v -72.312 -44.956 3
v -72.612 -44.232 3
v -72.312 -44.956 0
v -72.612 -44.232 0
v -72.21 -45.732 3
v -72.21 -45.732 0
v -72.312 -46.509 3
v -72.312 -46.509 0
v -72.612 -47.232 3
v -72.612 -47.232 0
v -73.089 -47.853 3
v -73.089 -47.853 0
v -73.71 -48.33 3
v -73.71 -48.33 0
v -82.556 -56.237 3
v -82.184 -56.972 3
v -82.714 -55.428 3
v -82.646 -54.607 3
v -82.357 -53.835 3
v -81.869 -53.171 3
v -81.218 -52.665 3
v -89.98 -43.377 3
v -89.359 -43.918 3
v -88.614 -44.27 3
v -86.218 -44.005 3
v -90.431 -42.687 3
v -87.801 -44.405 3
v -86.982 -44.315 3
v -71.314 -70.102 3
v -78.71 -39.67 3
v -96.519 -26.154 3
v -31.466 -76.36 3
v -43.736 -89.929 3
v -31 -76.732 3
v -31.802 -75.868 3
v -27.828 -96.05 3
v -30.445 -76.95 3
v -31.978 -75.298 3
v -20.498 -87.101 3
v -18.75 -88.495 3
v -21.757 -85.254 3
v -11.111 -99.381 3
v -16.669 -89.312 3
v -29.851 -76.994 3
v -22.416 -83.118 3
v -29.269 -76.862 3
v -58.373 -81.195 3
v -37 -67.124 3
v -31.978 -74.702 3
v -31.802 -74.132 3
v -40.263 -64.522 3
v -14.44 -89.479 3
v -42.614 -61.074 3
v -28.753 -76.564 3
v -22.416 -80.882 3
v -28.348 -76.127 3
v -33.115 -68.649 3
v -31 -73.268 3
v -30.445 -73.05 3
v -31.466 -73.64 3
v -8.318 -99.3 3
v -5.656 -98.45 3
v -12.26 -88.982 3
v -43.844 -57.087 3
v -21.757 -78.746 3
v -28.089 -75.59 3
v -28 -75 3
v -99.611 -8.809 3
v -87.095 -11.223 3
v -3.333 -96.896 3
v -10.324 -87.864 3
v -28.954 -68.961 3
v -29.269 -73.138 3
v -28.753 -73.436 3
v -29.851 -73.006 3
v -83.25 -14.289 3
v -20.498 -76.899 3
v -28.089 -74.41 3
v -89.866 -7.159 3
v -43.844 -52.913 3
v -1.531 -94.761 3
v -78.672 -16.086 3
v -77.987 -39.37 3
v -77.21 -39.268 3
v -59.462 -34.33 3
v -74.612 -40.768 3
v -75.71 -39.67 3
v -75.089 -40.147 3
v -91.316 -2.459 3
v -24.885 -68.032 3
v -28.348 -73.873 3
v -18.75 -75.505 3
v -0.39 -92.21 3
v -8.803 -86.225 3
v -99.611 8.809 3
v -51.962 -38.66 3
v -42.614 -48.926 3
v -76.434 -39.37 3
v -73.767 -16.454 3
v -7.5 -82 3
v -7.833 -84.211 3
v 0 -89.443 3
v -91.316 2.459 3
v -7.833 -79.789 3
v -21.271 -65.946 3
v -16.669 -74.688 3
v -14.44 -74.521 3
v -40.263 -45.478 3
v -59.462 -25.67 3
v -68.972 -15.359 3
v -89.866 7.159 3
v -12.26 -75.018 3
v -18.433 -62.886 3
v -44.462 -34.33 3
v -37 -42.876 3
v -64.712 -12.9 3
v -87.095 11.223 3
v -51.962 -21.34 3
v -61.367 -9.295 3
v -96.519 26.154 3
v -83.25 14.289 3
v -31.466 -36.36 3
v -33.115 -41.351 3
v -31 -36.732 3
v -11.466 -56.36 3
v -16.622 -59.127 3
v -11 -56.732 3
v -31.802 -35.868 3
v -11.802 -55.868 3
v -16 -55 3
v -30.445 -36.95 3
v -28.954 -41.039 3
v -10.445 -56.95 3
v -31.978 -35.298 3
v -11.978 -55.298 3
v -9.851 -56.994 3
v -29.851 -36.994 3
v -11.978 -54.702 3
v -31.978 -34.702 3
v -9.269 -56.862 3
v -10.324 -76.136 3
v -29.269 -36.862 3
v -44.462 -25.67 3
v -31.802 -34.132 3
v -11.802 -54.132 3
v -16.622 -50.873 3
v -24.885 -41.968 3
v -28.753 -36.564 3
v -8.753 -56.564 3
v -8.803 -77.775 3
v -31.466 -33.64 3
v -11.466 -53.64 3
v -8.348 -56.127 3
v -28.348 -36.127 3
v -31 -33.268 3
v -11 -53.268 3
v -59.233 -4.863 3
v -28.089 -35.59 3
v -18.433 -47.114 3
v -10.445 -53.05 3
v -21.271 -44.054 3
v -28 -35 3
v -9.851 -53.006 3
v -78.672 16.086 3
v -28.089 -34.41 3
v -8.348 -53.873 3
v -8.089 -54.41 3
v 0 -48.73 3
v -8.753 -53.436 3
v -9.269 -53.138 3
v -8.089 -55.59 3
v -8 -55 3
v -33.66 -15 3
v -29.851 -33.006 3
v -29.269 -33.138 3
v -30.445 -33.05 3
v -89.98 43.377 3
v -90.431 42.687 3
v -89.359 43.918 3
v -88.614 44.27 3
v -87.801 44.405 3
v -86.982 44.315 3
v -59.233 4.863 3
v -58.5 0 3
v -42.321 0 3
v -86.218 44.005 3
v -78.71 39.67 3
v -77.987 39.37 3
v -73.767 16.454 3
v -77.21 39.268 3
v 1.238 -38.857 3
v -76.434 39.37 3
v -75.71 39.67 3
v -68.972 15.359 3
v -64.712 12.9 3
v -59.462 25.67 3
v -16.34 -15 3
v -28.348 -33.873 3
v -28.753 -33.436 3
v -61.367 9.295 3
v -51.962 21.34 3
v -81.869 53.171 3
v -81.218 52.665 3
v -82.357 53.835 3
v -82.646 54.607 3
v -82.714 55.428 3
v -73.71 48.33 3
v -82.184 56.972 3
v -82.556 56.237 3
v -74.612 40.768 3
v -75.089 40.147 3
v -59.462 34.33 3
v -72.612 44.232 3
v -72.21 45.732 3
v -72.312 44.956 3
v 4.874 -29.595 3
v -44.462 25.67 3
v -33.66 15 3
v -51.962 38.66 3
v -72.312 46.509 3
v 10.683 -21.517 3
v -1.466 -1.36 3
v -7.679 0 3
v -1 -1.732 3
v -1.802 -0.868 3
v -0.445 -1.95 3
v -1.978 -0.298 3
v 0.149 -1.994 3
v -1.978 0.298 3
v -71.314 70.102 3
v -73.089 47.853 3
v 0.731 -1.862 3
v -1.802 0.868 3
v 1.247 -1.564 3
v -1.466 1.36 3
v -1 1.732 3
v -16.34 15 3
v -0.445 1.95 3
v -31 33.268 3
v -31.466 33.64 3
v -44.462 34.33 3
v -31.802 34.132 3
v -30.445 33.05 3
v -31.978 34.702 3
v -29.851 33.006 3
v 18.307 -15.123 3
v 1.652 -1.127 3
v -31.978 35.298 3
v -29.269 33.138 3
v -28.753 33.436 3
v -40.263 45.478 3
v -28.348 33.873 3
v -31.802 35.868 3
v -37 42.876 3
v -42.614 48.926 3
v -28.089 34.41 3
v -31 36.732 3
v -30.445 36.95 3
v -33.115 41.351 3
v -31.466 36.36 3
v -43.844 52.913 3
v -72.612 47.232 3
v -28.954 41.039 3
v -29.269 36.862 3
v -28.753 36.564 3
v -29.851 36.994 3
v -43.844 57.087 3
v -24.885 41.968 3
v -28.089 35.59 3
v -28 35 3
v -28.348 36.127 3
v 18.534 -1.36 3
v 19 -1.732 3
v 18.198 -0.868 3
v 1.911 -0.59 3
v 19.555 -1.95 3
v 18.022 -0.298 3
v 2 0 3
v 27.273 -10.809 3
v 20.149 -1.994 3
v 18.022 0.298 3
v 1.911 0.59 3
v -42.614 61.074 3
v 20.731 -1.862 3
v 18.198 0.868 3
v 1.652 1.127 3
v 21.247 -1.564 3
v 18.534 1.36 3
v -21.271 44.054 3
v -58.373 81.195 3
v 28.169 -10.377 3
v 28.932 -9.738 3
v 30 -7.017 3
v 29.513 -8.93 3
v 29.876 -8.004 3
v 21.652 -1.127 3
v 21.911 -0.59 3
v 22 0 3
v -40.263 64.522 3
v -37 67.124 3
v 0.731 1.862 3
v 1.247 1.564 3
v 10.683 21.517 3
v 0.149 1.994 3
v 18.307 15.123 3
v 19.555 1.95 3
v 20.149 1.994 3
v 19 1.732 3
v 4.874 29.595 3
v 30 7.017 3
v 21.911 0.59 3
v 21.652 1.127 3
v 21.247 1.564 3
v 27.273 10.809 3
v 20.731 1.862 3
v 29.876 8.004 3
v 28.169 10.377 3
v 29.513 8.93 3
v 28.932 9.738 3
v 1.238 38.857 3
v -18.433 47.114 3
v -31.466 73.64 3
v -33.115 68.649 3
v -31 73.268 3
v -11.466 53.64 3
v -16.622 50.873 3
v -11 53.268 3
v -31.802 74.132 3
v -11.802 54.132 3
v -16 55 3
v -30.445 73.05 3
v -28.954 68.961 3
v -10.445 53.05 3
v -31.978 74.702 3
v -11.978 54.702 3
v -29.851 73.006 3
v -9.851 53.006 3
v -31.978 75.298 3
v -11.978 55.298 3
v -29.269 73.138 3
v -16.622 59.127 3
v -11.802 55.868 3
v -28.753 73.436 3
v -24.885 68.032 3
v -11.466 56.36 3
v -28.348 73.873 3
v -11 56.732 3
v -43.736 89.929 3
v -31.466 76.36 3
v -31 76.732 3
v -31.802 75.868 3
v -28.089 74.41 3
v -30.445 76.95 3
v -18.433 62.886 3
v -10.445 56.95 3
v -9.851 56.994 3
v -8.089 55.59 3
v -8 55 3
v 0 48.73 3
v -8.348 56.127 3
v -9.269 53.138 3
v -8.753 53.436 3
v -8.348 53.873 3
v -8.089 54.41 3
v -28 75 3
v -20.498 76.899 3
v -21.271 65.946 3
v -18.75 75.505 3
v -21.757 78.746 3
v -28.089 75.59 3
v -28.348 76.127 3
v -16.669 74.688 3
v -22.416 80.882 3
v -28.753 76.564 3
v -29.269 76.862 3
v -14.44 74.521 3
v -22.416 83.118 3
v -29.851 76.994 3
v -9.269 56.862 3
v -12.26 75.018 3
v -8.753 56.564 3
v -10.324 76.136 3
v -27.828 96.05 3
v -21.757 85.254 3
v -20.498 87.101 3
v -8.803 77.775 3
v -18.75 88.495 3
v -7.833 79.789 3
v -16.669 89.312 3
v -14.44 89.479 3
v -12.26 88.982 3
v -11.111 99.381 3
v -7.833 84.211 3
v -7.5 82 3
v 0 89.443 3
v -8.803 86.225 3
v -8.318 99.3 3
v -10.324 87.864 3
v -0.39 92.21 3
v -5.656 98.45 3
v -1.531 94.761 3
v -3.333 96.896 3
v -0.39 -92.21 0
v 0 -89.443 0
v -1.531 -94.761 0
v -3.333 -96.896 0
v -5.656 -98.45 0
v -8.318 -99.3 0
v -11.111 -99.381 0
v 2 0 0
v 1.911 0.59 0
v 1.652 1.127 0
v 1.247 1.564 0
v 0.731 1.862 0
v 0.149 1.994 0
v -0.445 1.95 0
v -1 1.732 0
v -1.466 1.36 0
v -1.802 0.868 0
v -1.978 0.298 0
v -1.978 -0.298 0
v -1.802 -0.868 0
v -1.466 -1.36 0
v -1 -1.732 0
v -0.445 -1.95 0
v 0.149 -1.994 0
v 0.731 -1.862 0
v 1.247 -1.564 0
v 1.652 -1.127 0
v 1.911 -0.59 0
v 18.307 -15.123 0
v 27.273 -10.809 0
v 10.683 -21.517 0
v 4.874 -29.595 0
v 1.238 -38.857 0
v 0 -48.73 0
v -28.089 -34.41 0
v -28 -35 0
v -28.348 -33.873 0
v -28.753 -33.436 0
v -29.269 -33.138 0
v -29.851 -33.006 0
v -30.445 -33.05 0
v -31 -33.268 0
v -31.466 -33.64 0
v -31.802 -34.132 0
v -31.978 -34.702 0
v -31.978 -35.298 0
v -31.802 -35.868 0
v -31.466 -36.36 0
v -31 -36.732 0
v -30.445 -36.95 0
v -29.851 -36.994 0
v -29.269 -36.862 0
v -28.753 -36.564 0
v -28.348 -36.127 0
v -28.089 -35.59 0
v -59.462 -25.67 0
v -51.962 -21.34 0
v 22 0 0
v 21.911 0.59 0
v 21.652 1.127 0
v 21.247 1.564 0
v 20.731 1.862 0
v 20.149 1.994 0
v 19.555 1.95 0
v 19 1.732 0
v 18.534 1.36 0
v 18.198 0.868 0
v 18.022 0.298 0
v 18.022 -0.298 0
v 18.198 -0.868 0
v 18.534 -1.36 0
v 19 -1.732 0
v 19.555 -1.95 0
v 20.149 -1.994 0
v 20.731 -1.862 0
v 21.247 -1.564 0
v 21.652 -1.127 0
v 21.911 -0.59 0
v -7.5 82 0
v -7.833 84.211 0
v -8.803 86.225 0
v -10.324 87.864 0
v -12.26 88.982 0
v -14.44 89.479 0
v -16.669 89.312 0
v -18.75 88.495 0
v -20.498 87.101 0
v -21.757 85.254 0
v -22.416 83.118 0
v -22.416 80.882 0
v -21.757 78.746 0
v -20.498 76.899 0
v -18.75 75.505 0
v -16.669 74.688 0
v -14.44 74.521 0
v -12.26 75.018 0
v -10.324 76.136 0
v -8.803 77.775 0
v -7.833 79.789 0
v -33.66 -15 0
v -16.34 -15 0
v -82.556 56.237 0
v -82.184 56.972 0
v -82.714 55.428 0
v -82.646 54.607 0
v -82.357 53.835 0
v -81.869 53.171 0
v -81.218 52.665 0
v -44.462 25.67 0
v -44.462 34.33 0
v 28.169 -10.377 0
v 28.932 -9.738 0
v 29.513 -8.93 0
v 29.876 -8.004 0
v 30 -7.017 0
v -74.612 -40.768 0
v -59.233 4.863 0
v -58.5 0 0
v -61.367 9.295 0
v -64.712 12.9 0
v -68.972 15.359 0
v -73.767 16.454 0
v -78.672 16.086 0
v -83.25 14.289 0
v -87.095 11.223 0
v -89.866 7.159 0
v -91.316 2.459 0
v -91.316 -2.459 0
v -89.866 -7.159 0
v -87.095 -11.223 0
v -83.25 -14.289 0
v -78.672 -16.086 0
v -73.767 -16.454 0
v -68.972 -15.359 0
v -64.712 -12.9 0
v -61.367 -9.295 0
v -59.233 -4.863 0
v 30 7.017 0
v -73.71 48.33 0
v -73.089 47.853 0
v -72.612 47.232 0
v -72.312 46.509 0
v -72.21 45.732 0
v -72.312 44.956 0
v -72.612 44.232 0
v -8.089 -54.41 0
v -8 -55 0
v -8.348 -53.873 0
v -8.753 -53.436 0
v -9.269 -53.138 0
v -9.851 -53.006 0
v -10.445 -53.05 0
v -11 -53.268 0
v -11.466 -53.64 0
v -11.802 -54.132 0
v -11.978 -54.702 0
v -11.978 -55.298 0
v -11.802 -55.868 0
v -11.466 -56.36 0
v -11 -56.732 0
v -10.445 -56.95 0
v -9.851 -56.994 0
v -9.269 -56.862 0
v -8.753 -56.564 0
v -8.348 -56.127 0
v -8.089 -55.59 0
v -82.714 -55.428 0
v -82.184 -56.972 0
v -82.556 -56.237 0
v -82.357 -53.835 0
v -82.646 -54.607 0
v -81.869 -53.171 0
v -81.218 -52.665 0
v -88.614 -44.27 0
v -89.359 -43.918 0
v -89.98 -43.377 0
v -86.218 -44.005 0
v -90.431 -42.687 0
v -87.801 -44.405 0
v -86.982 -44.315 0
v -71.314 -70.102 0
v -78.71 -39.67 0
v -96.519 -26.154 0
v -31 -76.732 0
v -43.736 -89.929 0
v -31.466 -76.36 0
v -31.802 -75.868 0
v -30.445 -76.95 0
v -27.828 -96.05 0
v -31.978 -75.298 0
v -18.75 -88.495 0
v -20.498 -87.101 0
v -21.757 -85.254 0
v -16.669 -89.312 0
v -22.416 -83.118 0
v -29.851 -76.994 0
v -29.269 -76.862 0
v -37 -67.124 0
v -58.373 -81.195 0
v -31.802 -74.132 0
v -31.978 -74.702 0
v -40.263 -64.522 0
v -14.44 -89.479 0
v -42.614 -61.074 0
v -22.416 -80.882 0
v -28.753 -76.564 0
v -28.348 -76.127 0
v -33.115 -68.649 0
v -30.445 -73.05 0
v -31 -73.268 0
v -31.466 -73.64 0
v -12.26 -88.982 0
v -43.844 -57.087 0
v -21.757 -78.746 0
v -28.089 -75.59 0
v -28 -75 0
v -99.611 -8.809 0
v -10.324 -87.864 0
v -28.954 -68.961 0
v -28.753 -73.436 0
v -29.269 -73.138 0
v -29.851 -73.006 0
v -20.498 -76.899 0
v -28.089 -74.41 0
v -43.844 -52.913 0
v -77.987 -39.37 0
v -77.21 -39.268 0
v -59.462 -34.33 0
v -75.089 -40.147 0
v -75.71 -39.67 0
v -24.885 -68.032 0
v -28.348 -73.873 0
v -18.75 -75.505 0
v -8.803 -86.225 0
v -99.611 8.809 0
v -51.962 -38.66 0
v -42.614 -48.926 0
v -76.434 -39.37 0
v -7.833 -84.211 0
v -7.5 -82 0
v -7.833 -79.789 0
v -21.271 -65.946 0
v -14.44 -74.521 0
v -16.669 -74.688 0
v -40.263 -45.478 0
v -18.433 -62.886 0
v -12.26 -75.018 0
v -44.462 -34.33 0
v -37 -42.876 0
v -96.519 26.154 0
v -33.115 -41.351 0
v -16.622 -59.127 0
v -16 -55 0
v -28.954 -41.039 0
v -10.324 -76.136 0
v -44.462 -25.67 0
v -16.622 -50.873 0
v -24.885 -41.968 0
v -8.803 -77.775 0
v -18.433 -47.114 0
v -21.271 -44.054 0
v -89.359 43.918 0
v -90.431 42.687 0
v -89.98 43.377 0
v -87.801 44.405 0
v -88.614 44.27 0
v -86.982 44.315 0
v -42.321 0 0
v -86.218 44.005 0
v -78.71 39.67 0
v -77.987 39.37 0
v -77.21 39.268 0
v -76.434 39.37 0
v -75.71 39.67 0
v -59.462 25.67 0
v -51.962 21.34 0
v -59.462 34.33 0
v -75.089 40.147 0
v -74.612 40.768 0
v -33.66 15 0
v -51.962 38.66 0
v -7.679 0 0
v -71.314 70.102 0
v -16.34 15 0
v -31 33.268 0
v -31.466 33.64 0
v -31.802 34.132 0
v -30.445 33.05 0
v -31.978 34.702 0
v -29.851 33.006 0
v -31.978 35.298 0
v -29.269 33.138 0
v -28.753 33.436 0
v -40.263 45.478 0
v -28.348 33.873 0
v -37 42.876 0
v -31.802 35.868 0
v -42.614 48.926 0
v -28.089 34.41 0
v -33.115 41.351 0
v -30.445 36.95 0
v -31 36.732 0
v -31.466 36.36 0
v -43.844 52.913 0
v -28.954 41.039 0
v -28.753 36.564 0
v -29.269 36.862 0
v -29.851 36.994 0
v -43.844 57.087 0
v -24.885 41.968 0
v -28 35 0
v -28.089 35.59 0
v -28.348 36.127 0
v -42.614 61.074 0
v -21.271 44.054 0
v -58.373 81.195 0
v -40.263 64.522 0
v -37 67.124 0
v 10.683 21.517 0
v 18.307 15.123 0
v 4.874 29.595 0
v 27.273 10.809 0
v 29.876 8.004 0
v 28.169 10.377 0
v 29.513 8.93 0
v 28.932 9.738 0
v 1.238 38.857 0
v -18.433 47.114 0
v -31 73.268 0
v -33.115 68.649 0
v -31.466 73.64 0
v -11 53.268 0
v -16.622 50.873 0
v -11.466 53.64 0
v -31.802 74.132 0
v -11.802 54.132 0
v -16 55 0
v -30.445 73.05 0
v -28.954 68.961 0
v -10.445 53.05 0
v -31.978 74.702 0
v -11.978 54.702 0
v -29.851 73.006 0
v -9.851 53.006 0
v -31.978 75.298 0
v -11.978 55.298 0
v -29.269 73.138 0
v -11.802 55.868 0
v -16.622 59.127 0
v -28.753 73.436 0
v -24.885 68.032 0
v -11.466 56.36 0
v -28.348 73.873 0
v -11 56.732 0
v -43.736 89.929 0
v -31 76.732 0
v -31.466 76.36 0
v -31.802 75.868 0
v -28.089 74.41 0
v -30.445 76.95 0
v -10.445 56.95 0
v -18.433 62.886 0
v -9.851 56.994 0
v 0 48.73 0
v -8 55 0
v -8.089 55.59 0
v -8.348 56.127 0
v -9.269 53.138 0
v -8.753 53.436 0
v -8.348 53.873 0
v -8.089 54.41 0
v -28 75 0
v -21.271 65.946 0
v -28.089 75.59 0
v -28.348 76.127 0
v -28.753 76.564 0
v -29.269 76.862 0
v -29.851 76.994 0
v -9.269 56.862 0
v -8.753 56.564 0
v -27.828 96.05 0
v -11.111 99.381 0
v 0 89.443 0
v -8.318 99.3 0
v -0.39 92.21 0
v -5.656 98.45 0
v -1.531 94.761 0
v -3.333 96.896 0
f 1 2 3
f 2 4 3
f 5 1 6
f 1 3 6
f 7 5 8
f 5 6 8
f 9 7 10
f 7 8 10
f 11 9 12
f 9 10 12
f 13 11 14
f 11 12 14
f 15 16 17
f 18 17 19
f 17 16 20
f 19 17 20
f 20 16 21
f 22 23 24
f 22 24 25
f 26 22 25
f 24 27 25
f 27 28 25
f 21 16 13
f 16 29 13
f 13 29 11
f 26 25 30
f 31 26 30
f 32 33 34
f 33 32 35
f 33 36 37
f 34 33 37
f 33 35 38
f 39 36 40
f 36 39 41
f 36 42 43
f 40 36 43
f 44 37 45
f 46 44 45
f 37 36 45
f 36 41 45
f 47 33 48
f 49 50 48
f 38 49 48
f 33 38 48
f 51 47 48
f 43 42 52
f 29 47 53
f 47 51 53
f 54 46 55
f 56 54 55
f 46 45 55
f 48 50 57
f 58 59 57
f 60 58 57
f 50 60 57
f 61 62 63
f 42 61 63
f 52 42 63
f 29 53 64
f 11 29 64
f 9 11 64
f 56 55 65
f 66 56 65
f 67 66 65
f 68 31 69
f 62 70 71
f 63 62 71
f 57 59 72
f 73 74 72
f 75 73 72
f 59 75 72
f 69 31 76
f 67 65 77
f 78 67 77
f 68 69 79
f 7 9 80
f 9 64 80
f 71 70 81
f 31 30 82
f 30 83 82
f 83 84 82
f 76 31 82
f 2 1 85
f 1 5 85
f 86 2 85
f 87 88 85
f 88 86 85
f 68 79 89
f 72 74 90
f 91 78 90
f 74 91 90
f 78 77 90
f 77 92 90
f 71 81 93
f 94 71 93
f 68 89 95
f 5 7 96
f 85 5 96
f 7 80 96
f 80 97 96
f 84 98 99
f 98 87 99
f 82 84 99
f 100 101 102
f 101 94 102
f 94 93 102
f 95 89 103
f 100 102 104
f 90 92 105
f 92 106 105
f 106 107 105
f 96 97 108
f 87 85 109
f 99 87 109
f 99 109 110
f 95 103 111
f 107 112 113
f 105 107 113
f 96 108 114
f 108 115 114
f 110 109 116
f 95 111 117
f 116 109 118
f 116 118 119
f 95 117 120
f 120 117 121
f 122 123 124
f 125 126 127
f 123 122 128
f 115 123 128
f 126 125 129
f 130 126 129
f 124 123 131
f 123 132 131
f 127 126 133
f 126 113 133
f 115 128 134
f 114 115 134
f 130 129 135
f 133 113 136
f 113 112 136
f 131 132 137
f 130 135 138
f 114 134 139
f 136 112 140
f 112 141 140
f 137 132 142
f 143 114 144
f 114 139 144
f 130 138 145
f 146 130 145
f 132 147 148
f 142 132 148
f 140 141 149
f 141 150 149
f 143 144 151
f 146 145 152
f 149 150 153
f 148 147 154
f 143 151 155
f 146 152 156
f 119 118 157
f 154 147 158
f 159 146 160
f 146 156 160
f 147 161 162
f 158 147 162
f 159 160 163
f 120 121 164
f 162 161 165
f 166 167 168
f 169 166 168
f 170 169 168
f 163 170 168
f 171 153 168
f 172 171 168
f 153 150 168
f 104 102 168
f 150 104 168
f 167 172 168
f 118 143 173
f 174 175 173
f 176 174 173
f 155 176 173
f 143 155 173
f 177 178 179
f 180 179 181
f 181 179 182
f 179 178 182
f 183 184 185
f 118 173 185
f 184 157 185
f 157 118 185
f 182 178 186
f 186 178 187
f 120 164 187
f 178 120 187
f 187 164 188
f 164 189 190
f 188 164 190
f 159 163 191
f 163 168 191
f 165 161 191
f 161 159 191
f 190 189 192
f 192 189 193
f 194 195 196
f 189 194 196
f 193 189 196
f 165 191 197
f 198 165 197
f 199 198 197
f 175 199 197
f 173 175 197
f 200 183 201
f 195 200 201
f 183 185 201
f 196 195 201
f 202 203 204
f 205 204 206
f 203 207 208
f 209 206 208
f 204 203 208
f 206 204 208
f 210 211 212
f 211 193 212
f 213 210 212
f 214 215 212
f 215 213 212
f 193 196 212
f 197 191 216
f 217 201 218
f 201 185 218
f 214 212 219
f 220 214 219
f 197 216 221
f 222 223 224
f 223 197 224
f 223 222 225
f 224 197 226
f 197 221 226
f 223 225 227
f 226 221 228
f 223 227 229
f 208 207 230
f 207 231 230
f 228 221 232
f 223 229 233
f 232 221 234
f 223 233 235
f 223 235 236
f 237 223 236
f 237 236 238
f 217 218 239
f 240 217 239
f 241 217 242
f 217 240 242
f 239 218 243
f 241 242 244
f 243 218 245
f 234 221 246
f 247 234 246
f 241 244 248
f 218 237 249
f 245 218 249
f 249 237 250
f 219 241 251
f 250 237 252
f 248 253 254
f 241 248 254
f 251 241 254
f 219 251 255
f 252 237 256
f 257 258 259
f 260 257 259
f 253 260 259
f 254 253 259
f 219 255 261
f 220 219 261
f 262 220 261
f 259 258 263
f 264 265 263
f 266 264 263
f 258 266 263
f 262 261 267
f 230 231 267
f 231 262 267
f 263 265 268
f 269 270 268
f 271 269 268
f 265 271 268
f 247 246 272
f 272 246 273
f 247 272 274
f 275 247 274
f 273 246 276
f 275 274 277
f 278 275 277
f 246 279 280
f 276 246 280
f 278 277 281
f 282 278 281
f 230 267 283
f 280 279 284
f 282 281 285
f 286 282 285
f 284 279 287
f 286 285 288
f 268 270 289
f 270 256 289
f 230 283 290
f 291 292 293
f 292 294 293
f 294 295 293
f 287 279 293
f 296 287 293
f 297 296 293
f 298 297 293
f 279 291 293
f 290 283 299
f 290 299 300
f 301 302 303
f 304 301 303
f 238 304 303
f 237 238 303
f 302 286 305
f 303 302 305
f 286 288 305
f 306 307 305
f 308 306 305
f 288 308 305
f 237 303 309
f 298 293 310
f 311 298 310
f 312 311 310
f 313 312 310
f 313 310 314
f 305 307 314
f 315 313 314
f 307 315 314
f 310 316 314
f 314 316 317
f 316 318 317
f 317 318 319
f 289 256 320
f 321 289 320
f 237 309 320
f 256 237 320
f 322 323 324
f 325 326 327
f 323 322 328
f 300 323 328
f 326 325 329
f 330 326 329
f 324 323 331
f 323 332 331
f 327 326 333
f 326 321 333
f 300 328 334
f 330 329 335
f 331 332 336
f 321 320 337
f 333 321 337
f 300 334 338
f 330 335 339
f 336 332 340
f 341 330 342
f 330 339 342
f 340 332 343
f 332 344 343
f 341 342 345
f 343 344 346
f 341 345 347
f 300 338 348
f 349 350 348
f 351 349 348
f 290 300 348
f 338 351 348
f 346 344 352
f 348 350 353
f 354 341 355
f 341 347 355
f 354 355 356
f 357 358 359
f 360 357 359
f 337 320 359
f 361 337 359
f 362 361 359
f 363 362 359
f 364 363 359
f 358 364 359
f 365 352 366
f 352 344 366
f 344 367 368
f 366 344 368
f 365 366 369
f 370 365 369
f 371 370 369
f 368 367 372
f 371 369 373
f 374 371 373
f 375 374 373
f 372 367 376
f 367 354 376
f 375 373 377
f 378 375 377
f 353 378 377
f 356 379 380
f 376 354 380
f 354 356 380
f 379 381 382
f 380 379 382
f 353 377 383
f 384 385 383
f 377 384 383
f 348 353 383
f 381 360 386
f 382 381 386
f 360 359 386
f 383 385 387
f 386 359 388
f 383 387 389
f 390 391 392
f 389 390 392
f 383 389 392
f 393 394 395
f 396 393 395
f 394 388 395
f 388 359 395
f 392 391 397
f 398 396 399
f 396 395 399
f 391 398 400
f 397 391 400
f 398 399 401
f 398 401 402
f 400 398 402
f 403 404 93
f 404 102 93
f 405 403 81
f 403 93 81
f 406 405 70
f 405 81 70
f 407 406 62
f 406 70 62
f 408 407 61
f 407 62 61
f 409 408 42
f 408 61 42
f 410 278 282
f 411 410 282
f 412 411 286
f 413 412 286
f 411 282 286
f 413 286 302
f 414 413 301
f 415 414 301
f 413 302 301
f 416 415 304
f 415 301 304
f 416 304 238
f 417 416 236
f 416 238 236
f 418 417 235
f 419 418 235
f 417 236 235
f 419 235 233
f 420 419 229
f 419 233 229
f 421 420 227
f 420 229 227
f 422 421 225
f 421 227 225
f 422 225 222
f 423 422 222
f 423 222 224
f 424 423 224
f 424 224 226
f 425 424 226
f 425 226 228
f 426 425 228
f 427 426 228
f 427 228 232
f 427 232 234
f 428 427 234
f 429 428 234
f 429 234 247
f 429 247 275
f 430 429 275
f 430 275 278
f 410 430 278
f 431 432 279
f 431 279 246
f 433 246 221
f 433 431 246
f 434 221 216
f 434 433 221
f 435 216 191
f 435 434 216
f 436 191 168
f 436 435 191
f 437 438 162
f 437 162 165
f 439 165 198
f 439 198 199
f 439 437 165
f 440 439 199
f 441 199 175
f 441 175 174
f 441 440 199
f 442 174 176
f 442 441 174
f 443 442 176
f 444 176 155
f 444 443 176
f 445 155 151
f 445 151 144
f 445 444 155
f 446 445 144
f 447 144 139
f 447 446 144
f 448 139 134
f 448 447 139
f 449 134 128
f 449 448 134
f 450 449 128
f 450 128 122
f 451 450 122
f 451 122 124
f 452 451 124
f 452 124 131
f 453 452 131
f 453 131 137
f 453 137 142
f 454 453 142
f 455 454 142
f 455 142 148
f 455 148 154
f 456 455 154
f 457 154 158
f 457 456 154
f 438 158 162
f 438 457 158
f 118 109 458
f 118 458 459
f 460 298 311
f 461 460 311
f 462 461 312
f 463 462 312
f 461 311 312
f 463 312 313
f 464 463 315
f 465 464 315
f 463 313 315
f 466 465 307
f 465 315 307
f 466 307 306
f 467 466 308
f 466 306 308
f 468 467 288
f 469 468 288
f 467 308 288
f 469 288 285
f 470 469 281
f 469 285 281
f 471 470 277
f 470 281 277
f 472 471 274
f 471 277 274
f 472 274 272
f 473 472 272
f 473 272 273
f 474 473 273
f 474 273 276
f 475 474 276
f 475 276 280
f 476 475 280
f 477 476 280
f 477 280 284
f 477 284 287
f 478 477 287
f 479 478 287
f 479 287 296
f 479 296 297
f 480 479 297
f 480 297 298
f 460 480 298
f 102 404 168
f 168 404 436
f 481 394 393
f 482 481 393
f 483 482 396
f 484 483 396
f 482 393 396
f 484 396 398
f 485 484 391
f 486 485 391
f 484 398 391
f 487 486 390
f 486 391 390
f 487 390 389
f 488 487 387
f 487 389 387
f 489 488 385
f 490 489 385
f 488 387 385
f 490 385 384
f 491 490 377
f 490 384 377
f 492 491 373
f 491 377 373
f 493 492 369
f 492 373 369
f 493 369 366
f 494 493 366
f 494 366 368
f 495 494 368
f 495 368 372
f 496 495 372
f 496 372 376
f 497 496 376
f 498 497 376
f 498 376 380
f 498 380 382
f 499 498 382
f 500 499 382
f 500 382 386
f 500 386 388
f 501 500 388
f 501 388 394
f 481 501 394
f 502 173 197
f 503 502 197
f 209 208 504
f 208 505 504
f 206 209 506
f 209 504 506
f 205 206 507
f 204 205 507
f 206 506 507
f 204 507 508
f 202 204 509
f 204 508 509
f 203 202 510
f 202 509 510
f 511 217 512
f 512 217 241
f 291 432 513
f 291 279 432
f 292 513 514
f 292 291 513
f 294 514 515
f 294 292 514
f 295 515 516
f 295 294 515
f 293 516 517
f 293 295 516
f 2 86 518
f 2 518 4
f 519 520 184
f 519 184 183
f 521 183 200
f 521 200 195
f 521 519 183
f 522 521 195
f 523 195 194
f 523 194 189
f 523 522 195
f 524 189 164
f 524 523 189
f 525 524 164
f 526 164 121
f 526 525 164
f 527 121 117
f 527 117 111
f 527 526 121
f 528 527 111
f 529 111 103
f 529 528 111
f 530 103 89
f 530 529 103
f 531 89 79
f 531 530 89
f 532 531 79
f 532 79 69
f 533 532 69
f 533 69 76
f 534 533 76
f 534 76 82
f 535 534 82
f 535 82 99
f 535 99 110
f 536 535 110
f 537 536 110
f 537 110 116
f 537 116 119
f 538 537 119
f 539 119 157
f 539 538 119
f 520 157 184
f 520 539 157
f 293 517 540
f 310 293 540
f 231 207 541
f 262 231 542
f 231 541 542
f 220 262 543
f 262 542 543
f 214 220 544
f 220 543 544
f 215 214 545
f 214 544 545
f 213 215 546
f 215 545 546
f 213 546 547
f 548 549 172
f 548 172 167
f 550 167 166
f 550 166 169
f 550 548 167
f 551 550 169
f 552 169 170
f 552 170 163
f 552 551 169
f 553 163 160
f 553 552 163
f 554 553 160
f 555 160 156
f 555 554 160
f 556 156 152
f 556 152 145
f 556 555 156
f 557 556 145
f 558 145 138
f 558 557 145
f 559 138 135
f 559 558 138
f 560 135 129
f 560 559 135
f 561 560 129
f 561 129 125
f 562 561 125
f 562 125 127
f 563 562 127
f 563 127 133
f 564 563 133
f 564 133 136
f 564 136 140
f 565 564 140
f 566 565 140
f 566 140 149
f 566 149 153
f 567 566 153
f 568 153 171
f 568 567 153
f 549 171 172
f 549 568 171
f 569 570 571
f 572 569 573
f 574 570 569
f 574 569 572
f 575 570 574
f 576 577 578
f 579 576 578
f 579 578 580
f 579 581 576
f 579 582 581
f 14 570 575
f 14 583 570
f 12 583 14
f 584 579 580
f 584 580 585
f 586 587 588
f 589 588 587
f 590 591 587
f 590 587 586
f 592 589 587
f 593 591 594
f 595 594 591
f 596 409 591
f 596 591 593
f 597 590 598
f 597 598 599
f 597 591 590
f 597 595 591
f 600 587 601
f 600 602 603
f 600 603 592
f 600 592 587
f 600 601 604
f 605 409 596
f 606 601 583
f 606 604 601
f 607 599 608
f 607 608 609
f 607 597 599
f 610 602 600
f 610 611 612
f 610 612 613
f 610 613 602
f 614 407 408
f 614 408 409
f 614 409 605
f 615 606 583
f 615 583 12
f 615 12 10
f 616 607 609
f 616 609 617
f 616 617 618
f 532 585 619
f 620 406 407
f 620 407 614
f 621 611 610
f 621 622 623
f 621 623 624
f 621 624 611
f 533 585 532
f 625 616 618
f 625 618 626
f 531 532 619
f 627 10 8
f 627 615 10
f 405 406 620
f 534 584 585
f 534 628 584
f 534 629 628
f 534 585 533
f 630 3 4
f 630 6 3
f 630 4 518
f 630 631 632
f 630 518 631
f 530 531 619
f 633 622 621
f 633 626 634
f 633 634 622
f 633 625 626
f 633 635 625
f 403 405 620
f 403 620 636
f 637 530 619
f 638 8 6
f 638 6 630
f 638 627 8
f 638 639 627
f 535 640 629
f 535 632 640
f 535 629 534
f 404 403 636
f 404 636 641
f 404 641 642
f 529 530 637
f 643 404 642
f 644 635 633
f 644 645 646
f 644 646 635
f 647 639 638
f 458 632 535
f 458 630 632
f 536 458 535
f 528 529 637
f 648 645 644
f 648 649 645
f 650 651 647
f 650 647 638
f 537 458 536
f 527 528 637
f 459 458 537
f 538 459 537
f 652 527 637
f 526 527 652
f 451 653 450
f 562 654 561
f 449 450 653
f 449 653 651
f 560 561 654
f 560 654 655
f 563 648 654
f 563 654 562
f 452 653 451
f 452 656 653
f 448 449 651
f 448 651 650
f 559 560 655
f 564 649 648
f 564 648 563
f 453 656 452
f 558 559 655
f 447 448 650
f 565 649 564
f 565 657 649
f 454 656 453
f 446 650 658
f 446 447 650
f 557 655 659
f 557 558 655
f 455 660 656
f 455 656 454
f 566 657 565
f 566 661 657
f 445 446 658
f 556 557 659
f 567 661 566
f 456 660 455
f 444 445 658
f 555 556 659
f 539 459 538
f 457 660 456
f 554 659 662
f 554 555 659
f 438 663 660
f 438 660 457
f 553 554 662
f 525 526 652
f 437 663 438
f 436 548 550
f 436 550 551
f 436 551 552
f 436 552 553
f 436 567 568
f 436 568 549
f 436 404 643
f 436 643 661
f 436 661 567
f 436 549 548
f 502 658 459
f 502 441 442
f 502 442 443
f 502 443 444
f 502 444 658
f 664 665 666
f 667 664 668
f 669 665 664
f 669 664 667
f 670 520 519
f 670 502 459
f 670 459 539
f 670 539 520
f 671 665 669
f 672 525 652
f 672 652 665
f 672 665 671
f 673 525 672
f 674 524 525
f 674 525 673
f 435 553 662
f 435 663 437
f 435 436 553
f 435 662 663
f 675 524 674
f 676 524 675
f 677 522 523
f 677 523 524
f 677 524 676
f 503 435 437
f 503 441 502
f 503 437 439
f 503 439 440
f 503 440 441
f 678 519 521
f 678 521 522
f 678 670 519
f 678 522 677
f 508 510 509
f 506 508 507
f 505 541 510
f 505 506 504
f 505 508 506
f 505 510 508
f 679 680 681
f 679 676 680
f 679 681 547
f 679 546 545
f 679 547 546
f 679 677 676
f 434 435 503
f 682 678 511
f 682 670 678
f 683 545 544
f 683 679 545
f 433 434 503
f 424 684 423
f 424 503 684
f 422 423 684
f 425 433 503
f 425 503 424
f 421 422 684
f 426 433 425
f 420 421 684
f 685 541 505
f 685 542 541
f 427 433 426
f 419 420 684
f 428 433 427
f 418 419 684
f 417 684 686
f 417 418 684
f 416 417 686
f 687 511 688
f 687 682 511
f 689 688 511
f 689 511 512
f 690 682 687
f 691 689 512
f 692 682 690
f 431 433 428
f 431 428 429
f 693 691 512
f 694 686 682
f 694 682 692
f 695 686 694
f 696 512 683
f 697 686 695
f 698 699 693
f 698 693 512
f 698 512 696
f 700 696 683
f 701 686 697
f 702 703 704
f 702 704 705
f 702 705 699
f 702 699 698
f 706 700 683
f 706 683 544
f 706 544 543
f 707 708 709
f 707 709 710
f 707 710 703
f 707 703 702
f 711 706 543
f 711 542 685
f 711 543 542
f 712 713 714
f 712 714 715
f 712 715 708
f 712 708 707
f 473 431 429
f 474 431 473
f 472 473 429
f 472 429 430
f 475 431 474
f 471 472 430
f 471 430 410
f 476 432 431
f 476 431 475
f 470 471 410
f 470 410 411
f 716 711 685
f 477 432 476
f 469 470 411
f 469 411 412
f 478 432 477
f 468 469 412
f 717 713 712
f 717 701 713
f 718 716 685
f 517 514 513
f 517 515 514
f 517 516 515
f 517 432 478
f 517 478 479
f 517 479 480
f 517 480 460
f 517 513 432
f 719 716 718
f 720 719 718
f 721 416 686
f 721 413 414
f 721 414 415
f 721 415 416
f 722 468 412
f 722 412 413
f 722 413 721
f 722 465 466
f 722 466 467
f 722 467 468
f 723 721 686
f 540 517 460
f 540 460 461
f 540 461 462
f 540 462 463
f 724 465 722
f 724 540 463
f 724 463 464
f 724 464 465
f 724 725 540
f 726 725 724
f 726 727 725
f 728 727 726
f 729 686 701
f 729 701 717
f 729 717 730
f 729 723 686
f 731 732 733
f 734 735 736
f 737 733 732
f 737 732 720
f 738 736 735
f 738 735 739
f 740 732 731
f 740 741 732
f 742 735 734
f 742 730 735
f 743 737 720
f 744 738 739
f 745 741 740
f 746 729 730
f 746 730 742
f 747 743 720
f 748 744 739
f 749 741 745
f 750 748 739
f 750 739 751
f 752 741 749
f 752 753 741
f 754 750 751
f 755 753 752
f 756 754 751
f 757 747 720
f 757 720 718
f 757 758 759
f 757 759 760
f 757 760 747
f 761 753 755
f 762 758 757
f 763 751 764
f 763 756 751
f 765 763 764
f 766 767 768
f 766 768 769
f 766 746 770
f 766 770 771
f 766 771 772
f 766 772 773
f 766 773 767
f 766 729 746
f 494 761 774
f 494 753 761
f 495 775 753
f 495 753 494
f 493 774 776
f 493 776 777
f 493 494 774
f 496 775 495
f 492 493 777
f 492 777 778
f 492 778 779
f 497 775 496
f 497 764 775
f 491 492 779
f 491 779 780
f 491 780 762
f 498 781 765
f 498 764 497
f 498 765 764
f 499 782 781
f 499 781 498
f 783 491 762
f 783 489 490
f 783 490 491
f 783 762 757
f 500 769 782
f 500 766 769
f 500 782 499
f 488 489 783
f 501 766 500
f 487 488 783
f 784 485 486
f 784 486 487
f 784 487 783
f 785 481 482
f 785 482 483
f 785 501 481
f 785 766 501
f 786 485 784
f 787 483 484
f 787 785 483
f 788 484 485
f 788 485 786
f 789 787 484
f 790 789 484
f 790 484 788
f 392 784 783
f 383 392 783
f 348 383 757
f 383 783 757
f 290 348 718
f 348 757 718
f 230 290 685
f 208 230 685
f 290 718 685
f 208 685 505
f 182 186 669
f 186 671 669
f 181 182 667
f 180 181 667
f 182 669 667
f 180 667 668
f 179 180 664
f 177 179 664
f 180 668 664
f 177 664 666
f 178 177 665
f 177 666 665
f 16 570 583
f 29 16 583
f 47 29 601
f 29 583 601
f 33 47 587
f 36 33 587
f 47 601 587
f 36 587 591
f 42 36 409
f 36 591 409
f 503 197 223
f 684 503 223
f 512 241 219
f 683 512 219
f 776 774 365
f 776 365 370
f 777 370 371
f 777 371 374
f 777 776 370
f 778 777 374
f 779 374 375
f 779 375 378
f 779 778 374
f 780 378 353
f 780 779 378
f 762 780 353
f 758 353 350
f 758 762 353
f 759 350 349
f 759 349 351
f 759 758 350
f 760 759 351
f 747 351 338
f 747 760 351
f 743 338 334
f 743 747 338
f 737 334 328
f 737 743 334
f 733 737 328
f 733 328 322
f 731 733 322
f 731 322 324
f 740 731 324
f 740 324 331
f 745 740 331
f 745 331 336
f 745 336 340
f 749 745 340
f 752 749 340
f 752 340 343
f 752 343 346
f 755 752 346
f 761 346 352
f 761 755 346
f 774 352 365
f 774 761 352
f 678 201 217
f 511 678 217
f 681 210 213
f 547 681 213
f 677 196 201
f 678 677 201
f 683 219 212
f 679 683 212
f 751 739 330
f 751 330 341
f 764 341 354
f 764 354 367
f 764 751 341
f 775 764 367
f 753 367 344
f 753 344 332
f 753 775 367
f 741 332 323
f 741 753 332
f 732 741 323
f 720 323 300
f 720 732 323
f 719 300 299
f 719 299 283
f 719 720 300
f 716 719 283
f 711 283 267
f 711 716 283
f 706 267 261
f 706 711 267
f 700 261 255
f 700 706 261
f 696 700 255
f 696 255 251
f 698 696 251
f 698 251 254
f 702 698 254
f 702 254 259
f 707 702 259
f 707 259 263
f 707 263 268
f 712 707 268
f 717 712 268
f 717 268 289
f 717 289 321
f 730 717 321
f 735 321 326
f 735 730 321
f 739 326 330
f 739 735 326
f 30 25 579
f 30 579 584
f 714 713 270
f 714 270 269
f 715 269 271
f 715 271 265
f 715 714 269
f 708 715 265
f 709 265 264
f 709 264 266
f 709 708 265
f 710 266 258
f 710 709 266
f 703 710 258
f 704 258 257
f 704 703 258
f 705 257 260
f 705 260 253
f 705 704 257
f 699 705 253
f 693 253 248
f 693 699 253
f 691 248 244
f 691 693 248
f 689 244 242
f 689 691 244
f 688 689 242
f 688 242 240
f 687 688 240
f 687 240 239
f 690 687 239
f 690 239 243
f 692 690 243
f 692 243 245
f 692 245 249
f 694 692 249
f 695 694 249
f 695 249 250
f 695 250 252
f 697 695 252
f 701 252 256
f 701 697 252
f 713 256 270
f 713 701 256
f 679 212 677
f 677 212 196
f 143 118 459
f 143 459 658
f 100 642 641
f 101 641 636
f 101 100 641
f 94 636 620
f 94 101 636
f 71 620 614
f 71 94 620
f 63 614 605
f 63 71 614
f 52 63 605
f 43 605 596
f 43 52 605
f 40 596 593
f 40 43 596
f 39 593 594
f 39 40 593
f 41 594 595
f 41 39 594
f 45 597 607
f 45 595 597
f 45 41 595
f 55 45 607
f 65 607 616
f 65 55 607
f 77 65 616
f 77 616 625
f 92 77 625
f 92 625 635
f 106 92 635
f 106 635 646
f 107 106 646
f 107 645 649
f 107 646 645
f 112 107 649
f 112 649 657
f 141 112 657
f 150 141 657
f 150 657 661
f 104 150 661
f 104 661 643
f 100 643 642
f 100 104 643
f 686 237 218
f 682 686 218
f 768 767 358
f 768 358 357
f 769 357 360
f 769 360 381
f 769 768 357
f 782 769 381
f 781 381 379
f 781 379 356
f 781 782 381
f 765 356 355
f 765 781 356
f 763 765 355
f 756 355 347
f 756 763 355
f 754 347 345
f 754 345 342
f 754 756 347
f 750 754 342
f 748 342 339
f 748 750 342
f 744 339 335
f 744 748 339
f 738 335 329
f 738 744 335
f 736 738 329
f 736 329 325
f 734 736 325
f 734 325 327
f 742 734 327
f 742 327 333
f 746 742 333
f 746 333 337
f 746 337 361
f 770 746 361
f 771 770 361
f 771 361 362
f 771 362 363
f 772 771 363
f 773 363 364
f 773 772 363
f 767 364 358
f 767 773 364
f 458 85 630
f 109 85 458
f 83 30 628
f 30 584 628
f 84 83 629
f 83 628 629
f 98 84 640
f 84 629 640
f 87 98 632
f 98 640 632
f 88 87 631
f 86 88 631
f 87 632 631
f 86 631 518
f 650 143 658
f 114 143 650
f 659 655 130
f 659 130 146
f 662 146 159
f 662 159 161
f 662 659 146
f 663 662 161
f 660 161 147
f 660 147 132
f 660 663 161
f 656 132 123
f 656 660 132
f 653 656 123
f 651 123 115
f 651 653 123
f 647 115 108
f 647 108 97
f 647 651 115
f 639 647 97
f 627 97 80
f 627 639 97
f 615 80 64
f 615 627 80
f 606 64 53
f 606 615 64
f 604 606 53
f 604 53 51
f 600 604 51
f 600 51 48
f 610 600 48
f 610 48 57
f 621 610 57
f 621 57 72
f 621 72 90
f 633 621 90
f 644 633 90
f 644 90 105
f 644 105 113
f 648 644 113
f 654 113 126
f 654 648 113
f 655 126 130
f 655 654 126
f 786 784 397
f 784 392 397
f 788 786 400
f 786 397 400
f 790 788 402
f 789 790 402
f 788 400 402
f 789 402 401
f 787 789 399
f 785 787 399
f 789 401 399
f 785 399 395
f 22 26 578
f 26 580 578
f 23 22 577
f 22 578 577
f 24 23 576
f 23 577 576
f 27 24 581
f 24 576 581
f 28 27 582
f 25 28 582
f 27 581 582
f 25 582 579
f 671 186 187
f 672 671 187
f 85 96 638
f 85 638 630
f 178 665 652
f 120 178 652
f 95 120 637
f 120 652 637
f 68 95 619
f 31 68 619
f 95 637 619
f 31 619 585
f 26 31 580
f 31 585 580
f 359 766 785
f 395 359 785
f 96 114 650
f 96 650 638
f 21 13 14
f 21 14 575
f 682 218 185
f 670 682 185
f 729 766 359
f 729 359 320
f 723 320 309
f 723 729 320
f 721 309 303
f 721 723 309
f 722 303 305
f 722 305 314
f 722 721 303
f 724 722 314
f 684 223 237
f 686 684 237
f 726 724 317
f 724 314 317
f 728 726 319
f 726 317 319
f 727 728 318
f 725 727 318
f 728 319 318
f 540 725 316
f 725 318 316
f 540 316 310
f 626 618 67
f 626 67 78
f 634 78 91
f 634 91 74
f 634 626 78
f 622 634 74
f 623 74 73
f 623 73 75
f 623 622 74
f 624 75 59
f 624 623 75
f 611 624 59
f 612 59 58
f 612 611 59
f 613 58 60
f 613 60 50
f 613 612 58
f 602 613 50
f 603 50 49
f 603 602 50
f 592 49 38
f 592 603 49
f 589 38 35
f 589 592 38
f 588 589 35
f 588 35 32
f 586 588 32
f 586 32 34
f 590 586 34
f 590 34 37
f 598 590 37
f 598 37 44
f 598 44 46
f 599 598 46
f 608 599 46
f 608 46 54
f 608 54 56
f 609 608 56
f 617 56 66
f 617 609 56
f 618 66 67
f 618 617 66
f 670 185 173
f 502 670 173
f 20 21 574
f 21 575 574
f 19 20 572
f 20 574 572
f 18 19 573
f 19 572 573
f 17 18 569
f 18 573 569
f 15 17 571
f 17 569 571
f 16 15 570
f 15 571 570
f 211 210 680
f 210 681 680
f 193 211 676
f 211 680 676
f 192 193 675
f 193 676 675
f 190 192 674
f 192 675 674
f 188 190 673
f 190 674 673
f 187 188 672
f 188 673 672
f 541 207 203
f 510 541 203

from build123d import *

# Parameters (mm, degrees)
SKETCH_2_R             = 2
SKETCH_2_R_2           = 14
SKETCH_2_R_3           = 16.5
SKETCH_2_W             = 30
SKETCH_2_H             = 20
EXTRUDE_1_DEPTH        = 3
FILLET_1_R             = 40
FILLET_2_R             = 10
SKETCH_3_R             = 7.5
CUT_EXTRUDE_1_DEPTH    = 142.05975465
FILLET_3_R             = 3
FILLET_3_OF_MIRROR_1_R = 3
SKETCH_4_R             = 2
CUT_EXTRUDE_2_DEPTH    = 142.05975465
FILLET_4_R             = 4


with BuildPart() as part:
    # 草图2 → 凸台-拉伸1 (new body)
    # profile 1 of 2: a face of its own
    with BuildSketch(Plane.XY):
        with BuildLine():
            Line((0, 10), (0, 100))
            ThreePointArc((0, 100), (-100, 0), (0, -100))
            Line((0, -100), (0, -10))
            Line((0, -10), (0, 10))
        make_face()
        with Locations((-30, -75)):
            Circle(SKETCH_2_R, mode=Mode.SUBTRACT)
        with Locations((-30, -55)):
            Circle(SKETCH_2_R_2, mode=Mode.SUBTRACT)
        with Locations((-10, -55)):
            Circle(SKETCH_2_R, mode=Mode.SUBTRACT)
        with Locations((-30, -35)):
            Circle(SKETCH_2_R, mode=Mode.SUBTRACT)
        with Locations((-75, 0)):
            Circle(SKETCH_2_R_3, mode=Mode.SUBTRACT)
        with Locations((-30, 35)):
            Circle(SKETCH_2_R, mode=Mode.SUBTRACT)
        with Locations((-30, 55)):
            Circle(SKETCH_2_R_2, mode=Mode.SUBTRACT)
        with Locations((-10, 55)):
            Circle(SKETCH_2_R, mode=Mode.SUBTRACT)
        with Locations((-30, 75)):
            Circle(SKETCH_2_R, mode=Mode.SUBTRACT)
    # profile 2 of 2: a face of its own
    with BuildSketch(Plane.XY):
        with Locations((15, 0)):
            Rectangle(SKETCH_2_W, SKETCH_2_H)
    extrude(amount=EXTRUDE_1_DEPTH)

    # 圆角1
    # the kernel refuses this fillet: 40 mm, written as the material it adds along each edge
    with BuildSketch(Plane(origin=(0, 10, 0), x_dir=(0, 1, 0), z_dir=(0, 0, 1))) as fillet_1_piece_1:
        with BuildLine():
            CenterArc((38.729833462, -40), FILLET_1_R, 90, 75.522487814)
            Line((0, -30), (-0.774596669, -29.8))
            ThreePointArc((-0.774596669, -29.8), (-0.8, -15), (-0.8, 0))
            Line((-0.8, 0), (0, 0.8))
            Line((0, 0.8), (38.729833462, 0.8))
            Line((38.729833462, 0.8), (38.729833462, 0))
        make_face()
    extrude(amount=3)
    with BuildSketch(Plane(origin=(0, -10, 0), x_dir=(0, -1, 0), z_dir=(0, 0, 1))) as fillet_1_piece_2:
        with BuildLine():
            CenterArc((38.729833462, 40), FILLET_1_R, 194.477512186, 75.522487814)
            Line((0, 30), (-0.774596669, 29.8))
            ThreePointArc((-0.774596669, 29.8), (-0.8, 15), (-0.8, 0))
            Line((-0.8, 0), (0, -0.8))
            Line((0, -0.8), (38.729833462, -0.8))
            Line((38.729833462, -0.8), (38.729833462, 0))
        make_face()
    extrude(amount=3)

    # 圆角2
    fillet_2_edges = [part.edges().sort_by_distance(p)[0] for p in [
        (0, 100, 1.5),
        (0, -100, 1.5),
    ]]
    fillet(fillet_2_edges, radius=FILLET_2_R)

    # 草图3 → 切除-拉伸1 (cut, through all)
    with BuildSketch(Plane.XY.offset(3)):
        with BuildLine():
            Line((-76.112159322, 38.169872981), (-71.112159322, 46.830127019))
            Line((-71.112159322, 46.830127019), (-83.99421946, 54.267587908))
            ThreePointArc((-83.99421946, 54.267587908), (-86.602540378, 50), (-88.99421946, 45.60733387))
            Line((-88.99421946, 45.60733387), (-76.112159322, 38.169872981))
        make_face()
        Polygon((-42.320508076, 0), (-33.660254038, -15), (-16.339745962, -15), (-7.679491924, 0), (-16.339745962, 15), (-33.660254038, 15), align=None)
        Polygon((-59.461524227, 34.330127019), (-59.461524227, 25.669872981), (-51.961524227, 21.339745962), (-44.461524227, 25.669872981), (-44.461524227, 34.330127019), (-51.961524227, 38.660254038), align=None)
        with Locations((-15, 82)):
            Circle(SKETCH_3_R)
    cut_extrude_1 = extrude(amount=-CUT_EXTRUDE_1_DEPTH, mode=Mode.SUBTRACT)

    # 圆角3
    fillet_3_edges = [part.edges().sort_by_distance(p)[0] for p in [
        (-71.112159322, 46.830127019, 1.5),
        (-76.112159322, 38.169872981, 1.5),
        (-88.99421946, 45.60733387, 1.5),
        (-83.99421946, 54.267587908, 1.5),
    ]]
    fillet(fillet_3_edges, radius=FILLET_3_R)

    # 镜向1: 切除-拉伸1 across plane
    add(cut_extrude_1.mirror(Plane.ZX), mode=Mode.SUBTRACT)

    # 圆角3 of 镜向1
    fillet_3_of_mirror_1_edges = [part.edges().sort_by_distance(p)[0] for p in [
        (-71.112159322, -46.830127019, 1.5),
        (-76.112159322, -38.169872981, 1.5),
        (-88.99421946, -45.60733387, 1.5),
        (-83.99421946, -54.267587908, 1.5),
    ]]
    fillet(fillet_3_of_mirror_1_edges, radius=FILLET_3_OF_MIRROR_1_R)

    # 草图4 → 切除-拉伸2 (cut, through all)
    with BuildSketch(Plane.XY.offset(3)):
        with Locations((20, 0)):
            Circle(SKETCH_4_R)
        Circle(SKETCH_4_R)
    extrude(amount=-CUT_EXTRUDE_2_DEPTH, mode=Mode.SUBTRACT)

    # 圆角4
    fillet_4_edges = [part.edges().sort_by_distance(p)[0] for p in [
        (30, 10, 1.5),
        (30, -10, 1.5),
    ]]
    fillet(fillet_4_edges, radius=FILLET_4_R)


solid = part.part
